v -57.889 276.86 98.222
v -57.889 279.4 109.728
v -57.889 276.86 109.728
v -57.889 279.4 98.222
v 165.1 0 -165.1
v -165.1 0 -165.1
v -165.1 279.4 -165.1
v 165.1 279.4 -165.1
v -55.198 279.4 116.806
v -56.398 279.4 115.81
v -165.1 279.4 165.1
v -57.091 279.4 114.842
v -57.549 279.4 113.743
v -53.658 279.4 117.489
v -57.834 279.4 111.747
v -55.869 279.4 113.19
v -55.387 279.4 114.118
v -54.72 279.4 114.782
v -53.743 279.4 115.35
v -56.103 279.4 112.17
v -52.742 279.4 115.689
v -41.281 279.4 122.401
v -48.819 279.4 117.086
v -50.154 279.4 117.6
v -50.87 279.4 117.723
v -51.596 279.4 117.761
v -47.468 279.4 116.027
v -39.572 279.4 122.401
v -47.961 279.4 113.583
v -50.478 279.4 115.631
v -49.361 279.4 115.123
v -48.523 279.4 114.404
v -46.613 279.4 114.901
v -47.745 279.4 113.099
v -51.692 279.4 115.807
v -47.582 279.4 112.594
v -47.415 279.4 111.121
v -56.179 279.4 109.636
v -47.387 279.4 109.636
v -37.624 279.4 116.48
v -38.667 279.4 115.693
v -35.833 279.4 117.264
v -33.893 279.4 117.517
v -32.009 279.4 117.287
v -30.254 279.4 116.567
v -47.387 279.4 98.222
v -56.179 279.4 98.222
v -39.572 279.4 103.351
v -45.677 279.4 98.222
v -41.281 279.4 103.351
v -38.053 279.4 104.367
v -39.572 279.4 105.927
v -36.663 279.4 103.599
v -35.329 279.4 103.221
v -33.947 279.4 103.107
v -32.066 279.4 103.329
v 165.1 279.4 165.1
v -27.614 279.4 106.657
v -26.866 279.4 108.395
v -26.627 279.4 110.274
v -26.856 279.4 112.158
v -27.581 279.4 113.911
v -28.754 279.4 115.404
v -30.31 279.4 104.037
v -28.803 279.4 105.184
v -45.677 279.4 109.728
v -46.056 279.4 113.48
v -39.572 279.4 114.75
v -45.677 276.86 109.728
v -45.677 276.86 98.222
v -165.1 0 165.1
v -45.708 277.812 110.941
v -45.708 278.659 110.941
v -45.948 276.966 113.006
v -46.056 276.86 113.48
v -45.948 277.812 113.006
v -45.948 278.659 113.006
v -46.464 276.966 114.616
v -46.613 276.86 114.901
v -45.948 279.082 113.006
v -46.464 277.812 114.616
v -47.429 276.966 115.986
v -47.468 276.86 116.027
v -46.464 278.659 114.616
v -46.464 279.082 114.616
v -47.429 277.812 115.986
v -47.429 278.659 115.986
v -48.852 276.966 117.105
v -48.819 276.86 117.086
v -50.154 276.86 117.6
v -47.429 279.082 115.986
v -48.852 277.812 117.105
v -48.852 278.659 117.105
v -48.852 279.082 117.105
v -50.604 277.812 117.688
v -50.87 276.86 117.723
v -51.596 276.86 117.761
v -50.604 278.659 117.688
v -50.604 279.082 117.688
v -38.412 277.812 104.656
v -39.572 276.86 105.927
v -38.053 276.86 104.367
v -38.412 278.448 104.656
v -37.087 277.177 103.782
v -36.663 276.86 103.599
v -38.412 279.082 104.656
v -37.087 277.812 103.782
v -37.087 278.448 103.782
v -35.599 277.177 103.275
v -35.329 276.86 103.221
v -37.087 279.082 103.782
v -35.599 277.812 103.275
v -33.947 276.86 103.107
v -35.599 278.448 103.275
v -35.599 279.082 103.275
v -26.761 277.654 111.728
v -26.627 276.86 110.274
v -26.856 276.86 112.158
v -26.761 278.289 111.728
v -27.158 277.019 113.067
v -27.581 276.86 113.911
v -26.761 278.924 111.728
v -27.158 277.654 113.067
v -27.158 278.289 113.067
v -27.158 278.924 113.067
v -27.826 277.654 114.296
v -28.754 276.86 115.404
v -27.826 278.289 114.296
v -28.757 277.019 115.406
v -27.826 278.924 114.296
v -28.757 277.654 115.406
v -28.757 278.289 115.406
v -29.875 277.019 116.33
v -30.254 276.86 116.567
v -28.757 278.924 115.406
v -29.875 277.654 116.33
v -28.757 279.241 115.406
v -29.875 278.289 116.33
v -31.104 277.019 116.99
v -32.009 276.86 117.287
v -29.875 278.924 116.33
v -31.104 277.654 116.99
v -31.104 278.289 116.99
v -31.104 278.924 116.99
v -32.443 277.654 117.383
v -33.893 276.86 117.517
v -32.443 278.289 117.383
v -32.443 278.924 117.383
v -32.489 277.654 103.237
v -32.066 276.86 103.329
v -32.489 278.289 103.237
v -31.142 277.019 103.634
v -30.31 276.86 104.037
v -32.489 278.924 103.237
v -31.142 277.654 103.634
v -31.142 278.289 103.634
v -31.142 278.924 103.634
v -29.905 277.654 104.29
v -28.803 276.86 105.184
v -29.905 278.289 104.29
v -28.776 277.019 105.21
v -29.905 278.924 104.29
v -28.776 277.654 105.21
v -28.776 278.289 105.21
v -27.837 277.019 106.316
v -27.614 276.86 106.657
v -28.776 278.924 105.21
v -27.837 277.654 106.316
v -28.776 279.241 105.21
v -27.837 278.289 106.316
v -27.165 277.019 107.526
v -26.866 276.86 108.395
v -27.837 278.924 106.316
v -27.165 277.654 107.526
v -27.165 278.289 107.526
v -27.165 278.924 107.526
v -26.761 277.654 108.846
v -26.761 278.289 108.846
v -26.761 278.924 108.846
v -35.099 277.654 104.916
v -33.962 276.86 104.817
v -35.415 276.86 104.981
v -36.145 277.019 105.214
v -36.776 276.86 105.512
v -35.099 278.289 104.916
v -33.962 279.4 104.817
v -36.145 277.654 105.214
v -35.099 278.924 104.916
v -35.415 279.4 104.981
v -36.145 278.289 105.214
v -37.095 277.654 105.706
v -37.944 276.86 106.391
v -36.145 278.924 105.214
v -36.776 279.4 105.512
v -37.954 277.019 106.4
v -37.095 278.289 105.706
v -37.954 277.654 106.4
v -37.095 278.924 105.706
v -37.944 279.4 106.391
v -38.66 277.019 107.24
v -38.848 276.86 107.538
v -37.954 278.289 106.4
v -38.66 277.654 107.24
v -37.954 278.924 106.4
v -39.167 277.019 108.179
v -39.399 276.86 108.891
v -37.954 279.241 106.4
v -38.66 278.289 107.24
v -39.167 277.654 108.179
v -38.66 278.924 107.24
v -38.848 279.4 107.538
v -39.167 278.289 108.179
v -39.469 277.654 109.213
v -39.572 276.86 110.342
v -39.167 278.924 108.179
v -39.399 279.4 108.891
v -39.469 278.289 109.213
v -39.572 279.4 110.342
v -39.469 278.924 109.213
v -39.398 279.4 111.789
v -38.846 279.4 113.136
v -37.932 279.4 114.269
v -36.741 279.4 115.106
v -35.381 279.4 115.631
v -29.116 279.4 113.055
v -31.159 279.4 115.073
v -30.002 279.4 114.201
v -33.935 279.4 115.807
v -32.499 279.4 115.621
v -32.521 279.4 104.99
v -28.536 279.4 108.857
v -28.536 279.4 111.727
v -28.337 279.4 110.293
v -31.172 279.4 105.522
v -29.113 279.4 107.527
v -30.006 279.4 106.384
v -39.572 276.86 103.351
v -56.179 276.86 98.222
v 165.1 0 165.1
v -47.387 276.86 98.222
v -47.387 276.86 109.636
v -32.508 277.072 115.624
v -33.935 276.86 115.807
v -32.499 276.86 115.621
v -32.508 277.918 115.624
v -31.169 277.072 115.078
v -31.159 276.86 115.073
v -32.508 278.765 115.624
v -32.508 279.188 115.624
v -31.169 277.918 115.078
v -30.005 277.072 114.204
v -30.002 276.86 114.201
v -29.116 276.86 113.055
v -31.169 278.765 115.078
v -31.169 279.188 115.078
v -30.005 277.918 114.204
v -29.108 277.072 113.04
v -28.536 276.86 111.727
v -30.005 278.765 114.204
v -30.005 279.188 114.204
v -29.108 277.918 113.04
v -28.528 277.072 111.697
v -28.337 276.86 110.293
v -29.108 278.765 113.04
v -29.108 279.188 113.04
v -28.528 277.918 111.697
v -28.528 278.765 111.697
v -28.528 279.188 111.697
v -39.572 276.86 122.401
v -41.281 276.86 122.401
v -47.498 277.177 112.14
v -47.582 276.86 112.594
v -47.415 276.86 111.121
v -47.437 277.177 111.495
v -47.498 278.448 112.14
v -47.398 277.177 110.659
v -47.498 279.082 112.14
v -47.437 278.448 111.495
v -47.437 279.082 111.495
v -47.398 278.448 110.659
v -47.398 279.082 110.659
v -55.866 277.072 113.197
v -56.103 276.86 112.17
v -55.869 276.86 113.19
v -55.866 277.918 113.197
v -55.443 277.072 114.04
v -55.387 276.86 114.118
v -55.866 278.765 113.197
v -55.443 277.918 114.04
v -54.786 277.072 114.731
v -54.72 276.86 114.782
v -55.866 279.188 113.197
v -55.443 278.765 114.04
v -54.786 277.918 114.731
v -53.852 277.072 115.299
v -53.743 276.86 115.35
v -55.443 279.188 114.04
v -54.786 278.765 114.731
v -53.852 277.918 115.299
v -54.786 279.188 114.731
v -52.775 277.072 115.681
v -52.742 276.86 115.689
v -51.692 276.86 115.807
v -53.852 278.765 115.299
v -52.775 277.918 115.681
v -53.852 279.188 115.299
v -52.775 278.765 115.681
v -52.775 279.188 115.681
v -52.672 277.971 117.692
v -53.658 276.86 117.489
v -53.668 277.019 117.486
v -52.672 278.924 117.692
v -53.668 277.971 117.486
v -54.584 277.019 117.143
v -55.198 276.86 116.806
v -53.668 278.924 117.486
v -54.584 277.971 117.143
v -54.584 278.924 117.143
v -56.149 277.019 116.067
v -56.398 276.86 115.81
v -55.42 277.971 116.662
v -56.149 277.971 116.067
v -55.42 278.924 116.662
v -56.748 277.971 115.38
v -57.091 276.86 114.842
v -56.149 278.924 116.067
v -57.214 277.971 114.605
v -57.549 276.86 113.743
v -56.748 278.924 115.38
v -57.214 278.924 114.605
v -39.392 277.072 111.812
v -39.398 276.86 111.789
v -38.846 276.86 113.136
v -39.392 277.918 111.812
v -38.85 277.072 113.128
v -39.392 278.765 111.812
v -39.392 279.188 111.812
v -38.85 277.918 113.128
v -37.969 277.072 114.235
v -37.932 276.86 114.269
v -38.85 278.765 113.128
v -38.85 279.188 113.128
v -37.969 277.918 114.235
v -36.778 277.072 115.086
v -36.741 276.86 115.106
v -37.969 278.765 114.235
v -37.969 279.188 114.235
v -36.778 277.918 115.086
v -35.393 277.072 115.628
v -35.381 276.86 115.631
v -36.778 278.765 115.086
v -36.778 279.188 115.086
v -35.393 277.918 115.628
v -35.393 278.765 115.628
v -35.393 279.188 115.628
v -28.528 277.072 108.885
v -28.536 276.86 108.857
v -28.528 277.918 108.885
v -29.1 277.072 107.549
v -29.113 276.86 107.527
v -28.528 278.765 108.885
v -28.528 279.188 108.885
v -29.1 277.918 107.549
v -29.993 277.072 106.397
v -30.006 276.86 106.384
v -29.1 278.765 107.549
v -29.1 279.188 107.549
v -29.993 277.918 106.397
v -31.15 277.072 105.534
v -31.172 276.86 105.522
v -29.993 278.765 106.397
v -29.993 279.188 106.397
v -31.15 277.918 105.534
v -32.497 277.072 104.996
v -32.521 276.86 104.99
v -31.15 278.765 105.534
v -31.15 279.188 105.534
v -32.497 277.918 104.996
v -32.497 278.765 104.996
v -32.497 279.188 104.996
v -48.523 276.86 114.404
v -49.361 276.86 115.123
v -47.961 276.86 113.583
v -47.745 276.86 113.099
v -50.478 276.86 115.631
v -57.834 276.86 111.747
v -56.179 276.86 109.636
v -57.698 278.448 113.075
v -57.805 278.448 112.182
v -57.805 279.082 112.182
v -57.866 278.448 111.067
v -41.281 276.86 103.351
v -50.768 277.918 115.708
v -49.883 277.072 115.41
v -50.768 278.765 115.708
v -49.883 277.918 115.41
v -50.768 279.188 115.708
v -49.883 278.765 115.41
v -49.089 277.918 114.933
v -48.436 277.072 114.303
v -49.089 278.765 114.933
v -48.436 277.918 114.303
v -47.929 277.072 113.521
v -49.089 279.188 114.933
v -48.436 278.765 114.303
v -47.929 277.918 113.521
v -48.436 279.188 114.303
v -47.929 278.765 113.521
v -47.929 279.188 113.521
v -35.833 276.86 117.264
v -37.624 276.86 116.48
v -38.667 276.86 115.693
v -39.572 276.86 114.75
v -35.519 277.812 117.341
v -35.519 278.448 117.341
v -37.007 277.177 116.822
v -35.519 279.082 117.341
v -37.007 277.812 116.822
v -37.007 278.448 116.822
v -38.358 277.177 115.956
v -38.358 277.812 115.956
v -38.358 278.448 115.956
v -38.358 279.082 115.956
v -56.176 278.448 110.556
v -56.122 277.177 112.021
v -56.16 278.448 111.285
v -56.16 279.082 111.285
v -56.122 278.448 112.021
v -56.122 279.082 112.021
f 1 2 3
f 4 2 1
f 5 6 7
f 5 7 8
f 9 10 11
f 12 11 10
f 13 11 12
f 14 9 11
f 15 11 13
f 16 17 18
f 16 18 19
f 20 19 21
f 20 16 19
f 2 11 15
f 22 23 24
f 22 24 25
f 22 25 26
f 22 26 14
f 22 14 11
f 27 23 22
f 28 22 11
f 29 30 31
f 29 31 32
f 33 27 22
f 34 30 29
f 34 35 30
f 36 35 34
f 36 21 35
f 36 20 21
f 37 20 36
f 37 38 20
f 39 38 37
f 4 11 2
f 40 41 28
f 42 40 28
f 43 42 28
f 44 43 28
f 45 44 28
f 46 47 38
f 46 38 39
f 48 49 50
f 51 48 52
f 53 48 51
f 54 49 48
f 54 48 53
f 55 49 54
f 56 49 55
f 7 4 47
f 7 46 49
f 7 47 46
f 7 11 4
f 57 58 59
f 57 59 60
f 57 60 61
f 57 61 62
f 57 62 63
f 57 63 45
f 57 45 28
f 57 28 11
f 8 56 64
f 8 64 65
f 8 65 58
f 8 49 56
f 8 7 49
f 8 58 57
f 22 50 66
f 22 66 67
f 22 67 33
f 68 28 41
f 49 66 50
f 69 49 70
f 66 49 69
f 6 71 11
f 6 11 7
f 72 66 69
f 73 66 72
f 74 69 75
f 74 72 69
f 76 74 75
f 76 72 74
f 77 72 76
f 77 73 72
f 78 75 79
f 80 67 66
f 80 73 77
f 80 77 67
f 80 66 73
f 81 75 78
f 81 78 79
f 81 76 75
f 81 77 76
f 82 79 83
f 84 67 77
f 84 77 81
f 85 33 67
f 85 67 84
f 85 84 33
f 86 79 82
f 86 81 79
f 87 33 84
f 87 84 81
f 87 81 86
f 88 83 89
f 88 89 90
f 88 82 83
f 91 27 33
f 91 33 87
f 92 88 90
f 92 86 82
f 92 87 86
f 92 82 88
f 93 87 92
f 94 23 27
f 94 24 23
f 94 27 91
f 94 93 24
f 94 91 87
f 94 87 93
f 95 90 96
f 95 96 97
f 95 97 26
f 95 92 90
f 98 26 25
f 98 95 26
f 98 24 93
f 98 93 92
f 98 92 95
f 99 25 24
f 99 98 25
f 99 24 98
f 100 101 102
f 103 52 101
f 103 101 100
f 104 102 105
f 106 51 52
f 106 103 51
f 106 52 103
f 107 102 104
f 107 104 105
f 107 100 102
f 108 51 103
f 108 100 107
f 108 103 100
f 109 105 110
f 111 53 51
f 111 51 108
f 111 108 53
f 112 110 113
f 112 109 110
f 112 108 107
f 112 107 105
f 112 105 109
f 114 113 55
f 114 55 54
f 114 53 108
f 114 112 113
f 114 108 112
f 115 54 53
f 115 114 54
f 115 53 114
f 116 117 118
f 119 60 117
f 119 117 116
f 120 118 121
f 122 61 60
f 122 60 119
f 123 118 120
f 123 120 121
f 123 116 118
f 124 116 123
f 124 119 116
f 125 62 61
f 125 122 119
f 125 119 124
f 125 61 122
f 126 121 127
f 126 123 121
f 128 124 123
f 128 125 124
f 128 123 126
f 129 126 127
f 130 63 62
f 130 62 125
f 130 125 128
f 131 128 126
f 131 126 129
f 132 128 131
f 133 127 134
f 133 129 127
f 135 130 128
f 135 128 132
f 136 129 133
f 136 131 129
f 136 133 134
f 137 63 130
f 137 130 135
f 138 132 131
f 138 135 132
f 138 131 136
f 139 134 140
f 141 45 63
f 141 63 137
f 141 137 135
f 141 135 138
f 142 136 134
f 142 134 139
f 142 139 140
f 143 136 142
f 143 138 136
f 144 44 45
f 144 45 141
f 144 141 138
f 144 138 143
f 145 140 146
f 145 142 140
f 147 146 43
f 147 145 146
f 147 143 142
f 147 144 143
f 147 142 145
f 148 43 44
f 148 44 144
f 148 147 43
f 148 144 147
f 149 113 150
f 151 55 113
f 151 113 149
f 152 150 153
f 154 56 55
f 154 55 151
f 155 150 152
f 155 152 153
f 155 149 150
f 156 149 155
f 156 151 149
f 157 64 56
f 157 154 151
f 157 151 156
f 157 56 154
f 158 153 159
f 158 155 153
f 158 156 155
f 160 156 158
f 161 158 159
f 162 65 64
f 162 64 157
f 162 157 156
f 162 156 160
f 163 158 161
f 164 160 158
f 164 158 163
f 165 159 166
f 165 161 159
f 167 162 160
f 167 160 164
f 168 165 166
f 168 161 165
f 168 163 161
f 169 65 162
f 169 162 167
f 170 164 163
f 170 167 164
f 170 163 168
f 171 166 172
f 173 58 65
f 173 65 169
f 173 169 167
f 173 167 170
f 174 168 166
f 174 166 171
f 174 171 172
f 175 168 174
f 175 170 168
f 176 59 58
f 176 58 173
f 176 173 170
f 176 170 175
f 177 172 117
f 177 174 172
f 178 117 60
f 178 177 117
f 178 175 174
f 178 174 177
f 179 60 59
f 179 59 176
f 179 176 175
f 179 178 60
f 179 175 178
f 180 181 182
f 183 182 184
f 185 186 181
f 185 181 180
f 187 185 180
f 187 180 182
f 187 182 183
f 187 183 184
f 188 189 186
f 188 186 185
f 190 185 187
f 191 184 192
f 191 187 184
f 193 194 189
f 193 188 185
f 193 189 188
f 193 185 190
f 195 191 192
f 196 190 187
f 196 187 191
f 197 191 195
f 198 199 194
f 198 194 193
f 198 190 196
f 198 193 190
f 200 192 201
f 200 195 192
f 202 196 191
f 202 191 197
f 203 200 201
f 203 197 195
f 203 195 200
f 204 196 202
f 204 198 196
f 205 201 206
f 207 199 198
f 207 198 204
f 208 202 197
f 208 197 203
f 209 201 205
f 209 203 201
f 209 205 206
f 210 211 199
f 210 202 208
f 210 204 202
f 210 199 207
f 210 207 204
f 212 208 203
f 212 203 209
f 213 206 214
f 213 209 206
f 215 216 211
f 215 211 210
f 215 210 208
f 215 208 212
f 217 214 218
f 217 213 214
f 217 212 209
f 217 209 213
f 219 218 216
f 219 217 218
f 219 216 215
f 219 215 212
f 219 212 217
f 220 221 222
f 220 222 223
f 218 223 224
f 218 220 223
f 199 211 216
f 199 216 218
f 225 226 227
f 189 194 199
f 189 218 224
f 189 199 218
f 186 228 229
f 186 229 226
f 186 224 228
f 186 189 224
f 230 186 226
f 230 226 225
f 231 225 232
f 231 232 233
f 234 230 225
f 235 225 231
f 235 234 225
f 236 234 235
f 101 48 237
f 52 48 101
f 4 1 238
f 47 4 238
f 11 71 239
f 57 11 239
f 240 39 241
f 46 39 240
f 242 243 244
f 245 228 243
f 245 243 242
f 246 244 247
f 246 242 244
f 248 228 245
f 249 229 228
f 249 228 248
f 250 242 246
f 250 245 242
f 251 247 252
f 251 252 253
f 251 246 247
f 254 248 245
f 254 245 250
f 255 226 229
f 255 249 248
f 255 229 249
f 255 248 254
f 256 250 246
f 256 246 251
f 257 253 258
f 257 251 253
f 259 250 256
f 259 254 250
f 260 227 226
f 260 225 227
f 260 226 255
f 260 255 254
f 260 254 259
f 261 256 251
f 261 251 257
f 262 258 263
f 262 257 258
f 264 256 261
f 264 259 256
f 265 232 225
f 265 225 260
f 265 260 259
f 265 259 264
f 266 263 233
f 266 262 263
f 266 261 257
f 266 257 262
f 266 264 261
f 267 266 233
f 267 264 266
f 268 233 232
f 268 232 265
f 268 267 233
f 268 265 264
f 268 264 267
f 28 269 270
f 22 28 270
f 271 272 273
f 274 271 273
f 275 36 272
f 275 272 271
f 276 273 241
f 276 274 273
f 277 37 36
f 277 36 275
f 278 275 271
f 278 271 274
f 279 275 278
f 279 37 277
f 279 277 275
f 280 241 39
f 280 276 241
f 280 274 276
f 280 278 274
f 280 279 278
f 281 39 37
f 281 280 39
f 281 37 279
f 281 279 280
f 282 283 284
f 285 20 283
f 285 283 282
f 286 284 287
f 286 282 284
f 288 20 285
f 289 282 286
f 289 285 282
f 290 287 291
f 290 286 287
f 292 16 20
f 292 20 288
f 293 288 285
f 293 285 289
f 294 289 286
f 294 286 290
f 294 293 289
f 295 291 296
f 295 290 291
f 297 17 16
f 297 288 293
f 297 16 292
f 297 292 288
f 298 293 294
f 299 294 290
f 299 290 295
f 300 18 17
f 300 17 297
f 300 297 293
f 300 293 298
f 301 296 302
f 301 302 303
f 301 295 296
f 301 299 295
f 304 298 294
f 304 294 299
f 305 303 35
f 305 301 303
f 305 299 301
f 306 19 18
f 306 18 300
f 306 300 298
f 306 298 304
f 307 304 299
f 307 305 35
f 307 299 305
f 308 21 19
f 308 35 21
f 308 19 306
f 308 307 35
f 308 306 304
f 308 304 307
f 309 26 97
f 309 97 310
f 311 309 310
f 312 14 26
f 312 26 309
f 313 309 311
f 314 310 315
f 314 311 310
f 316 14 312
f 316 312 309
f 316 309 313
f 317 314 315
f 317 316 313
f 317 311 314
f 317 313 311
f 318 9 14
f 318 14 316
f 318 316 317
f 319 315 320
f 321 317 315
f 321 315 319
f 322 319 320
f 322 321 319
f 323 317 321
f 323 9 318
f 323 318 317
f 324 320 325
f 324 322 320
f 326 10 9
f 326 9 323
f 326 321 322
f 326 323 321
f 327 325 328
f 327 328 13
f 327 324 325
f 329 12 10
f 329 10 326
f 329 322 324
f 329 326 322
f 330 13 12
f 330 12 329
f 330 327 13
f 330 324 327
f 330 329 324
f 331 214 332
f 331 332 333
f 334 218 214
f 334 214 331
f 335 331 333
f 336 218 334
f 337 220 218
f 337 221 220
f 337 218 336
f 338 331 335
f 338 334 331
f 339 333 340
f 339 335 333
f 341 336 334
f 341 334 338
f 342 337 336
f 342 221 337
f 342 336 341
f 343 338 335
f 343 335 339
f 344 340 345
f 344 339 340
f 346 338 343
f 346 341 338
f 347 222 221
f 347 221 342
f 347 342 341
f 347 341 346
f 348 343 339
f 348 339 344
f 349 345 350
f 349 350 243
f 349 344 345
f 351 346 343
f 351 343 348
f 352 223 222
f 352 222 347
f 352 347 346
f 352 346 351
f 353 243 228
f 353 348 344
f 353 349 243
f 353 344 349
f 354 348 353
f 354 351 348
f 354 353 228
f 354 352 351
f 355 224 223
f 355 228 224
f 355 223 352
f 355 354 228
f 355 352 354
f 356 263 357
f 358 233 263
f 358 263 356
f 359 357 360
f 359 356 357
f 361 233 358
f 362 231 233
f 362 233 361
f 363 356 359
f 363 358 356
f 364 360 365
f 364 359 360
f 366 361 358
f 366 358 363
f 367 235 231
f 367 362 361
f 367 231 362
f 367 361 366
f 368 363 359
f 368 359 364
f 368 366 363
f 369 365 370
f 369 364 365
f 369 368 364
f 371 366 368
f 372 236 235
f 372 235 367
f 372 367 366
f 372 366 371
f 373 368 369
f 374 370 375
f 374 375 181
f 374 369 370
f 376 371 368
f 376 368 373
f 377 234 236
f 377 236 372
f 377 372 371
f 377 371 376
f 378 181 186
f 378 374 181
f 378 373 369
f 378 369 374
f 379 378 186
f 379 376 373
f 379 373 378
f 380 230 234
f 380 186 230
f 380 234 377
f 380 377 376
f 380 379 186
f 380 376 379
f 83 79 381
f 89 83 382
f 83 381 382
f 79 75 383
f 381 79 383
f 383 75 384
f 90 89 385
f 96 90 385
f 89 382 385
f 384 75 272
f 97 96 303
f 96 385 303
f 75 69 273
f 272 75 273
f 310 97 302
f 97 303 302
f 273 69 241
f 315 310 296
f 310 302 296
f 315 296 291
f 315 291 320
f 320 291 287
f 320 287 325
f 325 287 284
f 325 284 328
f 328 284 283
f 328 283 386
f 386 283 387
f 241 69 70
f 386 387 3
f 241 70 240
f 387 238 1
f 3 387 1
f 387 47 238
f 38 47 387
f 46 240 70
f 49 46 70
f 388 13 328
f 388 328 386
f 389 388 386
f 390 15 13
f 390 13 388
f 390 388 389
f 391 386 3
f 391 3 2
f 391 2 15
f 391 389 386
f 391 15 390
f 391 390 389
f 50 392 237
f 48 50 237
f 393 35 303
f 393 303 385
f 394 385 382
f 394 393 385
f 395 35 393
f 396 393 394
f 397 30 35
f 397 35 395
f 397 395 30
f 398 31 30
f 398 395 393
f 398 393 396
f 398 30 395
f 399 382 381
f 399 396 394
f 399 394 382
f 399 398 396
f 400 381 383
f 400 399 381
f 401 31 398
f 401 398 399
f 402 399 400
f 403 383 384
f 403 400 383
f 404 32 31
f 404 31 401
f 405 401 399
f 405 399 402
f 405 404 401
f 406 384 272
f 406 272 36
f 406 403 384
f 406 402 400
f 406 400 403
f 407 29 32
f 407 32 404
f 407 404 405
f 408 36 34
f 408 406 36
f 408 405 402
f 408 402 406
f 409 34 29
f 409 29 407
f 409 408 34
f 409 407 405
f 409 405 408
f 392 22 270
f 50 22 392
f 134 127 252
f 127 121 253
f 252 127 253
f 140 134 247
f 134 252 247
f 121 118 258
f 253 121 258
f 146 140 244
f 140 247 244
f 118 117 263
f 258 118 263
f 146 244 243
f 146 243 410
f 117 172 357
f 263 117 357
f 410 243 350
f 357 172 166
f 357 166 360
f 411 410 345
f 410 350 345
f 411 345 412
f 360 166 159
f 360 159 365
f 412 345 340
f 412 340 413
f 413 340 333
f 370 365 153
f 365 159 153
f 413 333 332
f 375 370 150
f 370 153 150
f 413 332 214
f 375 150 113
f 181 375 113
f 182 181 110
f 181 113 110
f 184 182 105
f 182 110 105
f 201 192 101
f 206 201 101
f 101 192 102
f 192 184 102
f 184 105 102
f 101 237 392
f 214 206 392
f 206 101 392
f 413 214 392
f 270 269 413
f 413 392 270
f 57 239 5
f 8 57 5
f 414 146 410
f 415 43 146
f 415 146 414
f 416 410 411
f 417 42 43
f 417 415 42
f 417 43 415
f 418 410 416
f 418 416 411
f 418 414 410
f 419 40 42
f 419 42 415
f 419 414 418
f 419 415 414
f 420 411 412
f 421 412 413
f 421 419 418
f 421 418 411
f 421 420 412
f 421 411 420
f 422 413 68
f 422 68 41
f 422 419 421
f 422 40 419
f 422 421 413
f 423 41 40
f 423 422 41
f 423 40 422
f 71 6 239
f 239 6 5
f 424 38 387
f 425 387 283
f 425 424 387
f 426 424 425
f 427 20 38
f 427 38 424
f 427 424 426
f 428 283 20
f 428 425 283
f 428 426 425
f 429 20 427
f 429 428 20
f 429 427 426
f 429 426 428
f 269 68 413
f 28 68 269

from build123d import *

# Parameters (mm, degrees)
SKETCH1_W           = 330.2
SKETCH1_H           = 330.2
BOSS_EXTRUDE1_DEPTH = 279.4
CUT_EXTRUDE1_DEPTH  = 2.54


with BuildPart() as part:
    # Sketch1 → Boss-Extrude1 (new body)
    with BuildSketch(Plane(origin=(0, 0, 0), x_dir=(1, 0, 0), z_dir=(0, 1, 0))):
        Rectangle(SKETCH1_W, SKETCH1_H)
    extrude(amount=BOSS_EXTRUDE1_DEPTH)

    # Sketch2 → Cut-Extrude1 (cut)
    # profile 1 of 2: a face of its own
    with BuildSketch(Plane(origin=(0, 279.4, 0), x_dir=(1, 0, 0), z_dir=(0, 1, 0))):
        with BuildLine():
            Line((-57.888961079, -98.222414931), (-56.179345694, -98.222414931))
            Line((-56.179345694, -98.222414931), (-56.179345694, -109.636387287))
            add(Edge.make_bspline(
                [(-56.179345694, -109.636387287), (-56.179600115, -109.797935292), (-56.180082922, -110.10450047), (-56.176857954, -110.540845077), (-56.167826249, -110.92877089), (-56.162132152, -111.269773224), (-56.149464808, -111.562287321), (-56.13913401, -111.807897941), (-56.125850408, -112.0054421), (-56.109885869, -112.120726855), (-56.103023579, -112.170281518)],
                knots=[0, 0, 0, 0, 1.528628734, 2.90083645, 4.128790002, 5.200304208, 6.127813768, 6.898992206, 7.526736466, 8, 8, 8, 8], degree=3))
            add(Edge.make_bspline(
                [(-56.103023579, -112.170281518), (-56.07484341, -112.349061758), (-56.020070925, -112.696548613), (-55.880481354, -113.191349404), (-55.685531813, -113.637290627), (-55.454520395, -114.048287797), (-55.150087182, -114.412901314), (-54.785396511, -114.748789024), (-54.343557514, -115.042549846), (-53.852281931, -115.311159265), (-53.322772282, -115.527050642), (-52.78169096, -115.690300239), (-52.237171317, -115.789789679), (-51.872629618, -115.801309699), (-51.69160531, -115.807030316)],
                knots=[0, 0, 0, 0, 1.035780045, 2.013197591, 2.933192213, 3.817615948, 4.702609284, 5.640816605, 6.646850145, 7.73207398, 8.84249596, 9.914020372, 10.964143139, 12, 12, 12, 12], degree=3))
            add(Edge.make_bspline(
                [(-51.69160531, -115.807030316), (-51.53619138, -115.801185502), (-51.22626115, -115.789529633), (-50.765760435, -115.717349558), (-50.317268415, -115.587262194), (-49.878570428, -115.419405794), (-49.467357213, -115.197622477), (-49.083399336, -114.941422622), (-48.740695637, -114.640917711), (-48.427959963, -114.308357265), (-48.155626955, -113.933127782), (-47.919564027, -113.523399631), (-47.726201467, -113.073006757), (-47.630714567, -112.756480544), (-47.581659396, -112.593869258)],
                knots=[0, 0, 0, 0, 0.994687771, 1.983630487, 2.973142513, 3.978332533, 4.983357753, 5.956394766, 6.925816176, 7.893390482, 8.871859704, 9.88551698, 10.913711441, 12, 12, 12, 12], degree=3))
            add(Edge.make_bspline(
                [(-47.581659396, -112.593869258), (-47.565330143, -112.526657732), (-47.528941986, -112.376883366), (-47.494940212, -112.123674627), (-47.459526124, -111.824919661), (-47.434953964, -111.478471937), (-47.41099875, -111.085492357), (-47.396667311, -110.643933727), (-47.390043175, -110.155399412), (-47.388069158, -109.814474289), (-47.387038002, -109.636387287)],
                knots=[0, 0, 0, 0, 0.558680831, 1.244966039, 2.062412453, 2.990489873, 4.051219941, 5.244515665, 6.560634259, 8, 8, 8, 8], degree=3))
            Line((-47.387038002, -109.636387287), (-47.387038002, -98.222414931))
            Line((-47.387038002, -98.222414931), (-45.677422617, -98.222414931))
            Line((-45.677422617, -98.222414931), (-45.677422617, -109.727973826))
            add(Edge.make_bspline(
                [(-45.677422617, -109.727973826), (-45.678805758, -109.93533786), (-45.681505042, -110.34002138), (-45.704912466, -110.933028062), (-45.742234136, -111.495563575), (-45.794965015, -112.027703534), (-45.864834989, -112.527543744), (-45.942532975, -112.999465411), (-46.041481577, -113.440080985), (-46.157051946, -113.852826001), (-46.2891694, -114.245721438), (-46.460299079, -114.618604041), (-46.653109572, -114.982809559), (-46.881789325, -115.332829409), (-47.138754137, -115.670213362), (-47.429683999, -115.992915328), (-47.744956932, -116.306092137), (-48.089813963, -116.601710397), (-48.458570394, -116.87281191), (-48.850129306, -117.111196921), (-49.261482867, -117.312711182), (-49.691561796, -117.478587285), (-50.140549629, -117.603308174), (-50.608457687, -117.696245808), (-51.096351011, -117.749054028), (-51.428172925, -117.756902247), (-51.596202666, -117.76087647)],
                knots=[0, 0, 0, 0, 1.316592851, 2.569410997, 3.76748051, 4.895814652, 5.963796859, 6.97159953, 7.931736103, 8.829262218, 9.692595152, 10.560224239, 11.431080259, 12.30701507, 13.211635791, 14.121146779, 15.063487852, 16.031507147, 17.00238618, 17.966455255, 18.938106653, 19.907068911, 20.888905087, 21.893141452, 22.933117798, 24, 24, 24, 24], degree=3))
            add(Edge.make_bspline(
                [(-51.596202666, -117.76087647), (-51.779458781, -117.756605105), (-52.139006624, -117.748224701), (-52.668803819, -117.700203733), (-53.176699659, -117.609752186), (-53.668058361, -117.494581636), (-54.136190324, -117.335738723), (-54.5873675, -117.1501475), (-55.013862607, -116.922215555), (-55.422594664, -116.668614373), (-55.802640837, -116.383274557), (-56.151513846, -116.072268753), (-56.469789656, -115.740578984), (-56.75210356, -115.384614136), (-57.003132946, -115.007142703), (-57.219378822, -114.60709684), (-57.405052336, -114.184631434), (-57.500882365, -113.890971871), (-57.549327666, -113.742517095)],
                knots=[0, 0, 0, 0, 1.13879206, 2.234305948, 3.301075583, 4.341971843, 5.366689343, 6.369221514, 7.369726634, 8.367512178, 9.355451585, 10.318319045, 11.268648973, 12.207971039, 13.137398894, 14.081662264, 15.030215811, 16, 16, 16, 16], degree=3))
            add(Edge.make_bspline(
                [(-57.549327666, -113.742517095), (-57.577506198, -113.641102654), (-57.638626062, -113.421132473), (-57.704078039, -113.057078871), (-57.759100326, -112.637897676), (-57.810837722, -112.163560196), (-57.841366479, -111.633698779), (-57.868131395, -111.048543109), (-57.889149635, -110.407385632), (-57.889025688, -109.960774625), (-57.888961079, -109.727973826)],
                knots=[0, 0, 0, 0, 0.625038921, 1.35572334, 2.194682327, 3.136881307, 4.189498639, 5.346923369, 6.617055217, 8, 8, 8, 8], degree=3))
            Line((-57.888961079, -109.727973826), (-57.888961079, -98.222414931))
        make_face()
    # profile 2 of 2: a face of its own
    with BuildSketch(Plane(origin=(0, 279.4, 0), x_dir=(1, 0, 0), z_dir=(0, 1, 0))):
        with BuildLine():
            Line((-41.281268771, -103.351261085), (-39.571653387, -103.351261085))
            Line((-39.571653387, -103.351261085), (-39.571653387, -105.927132479))
            add(Edge.make_bspline(
                [(-39.571653387, -105.927132479), (-39.390093366, -105.693428528), (-39.037267801, -105.239271668), (-38.429165104, -104.651496825), (-37.78730633, -104.155786958), (-37.095174042, -103.767262029), (-36.363525101, -103.474323038), (-35.595362059, -103.257809175), (-34.784165353, -103.130220578), (-34.229557517, -103.114862679), (-33.946713483, -103.107030316)],
                knots=[0, 0, 0, 0, 1.0828784, 2.104357462, 3.088488658, 4.04616522, 5.001424249, 5.969181776, 6.964304535, 8, 8, 8, 8], degree=3))
            add(Edge.make_bspline(
                [(-33.946713483, -103.107030316), (-33.699653471, -103.114177761), (-33.211326379, -103.128305062), (-32.49252509, -103.223952687), (-31.800327646, -103.387878985), (-31.138650095, -103.624103967), (-30.500403983, -103.916143025), (-29.895037982, -104.284717175), (-29.313122772, -104.711470871), (-28.769293229, -105.202591578), (-28.266801214, -105.733968285), (-27.832209857, -106.305589683), (-27.457349921, -106.898657475), (-27.15434445, -107.522365862), (-26.916990445, -108.171803385), (-26.748181985, -108.849593899), (-26.647719668, -109.553224375), (-26.634240696, -110.031666325), (-26.627422617, -110.273676951)],
                knots=[0, 0, 0, 0, 1.041296284, 2.058176809, 3.050446431, 4.034000596, 5.01514041, 6.003636468, 7.015969324, 8.052561599, 9.08815499, 10.094063707, 11.074456064, 12.040834395, 13.011057502, 13.983766392, 14.980127149, 16, 16, 16, 16], degree=3))
            add(Edge.make_bspline(
                [(-26.627422617, -110.273676951), (-26.63409276, -110.52079523), (-26.647247245, -111.008148139), (-26.749273634, -111.723813625), (-26.91232462, -112.412266331), (-27.14668416, -113.072361151), (-27.449532832, -113.703643596), (-27.818039082, -114.305658409), (-28.25284971, -114.878212708), (-28.749788705, -115.413533493), (-29.288919686, -115.90665261), (-29.865195736, -116.337934103), (-30.469673602, -116.700109303), (-31.099260683, -117.002639411), (-31.759346659, -117.230652585), (-32.446851784, -117.395123757), (-33.161401753, -117.496548655), (-33.647455166, -117.509895316), (-33.893288002, -117.516645701)],
                knots=[0, 0, 0, 0, 1.038740735, 2.04854663, 3.033179607, 4.009277356, 4.987731542, 5.972001279, 6.972200261, 8.005528982, 9.039189865, 10.040446548, 11.026516639, 11.997840187, 12.972163198, 13.956796175, 14.96660207, 16, 16, 16, 16], degree=3))
            add(Edge.make_bspline(
                [(-33.893288002, -117.516645701), (-34.169935215, -117.509598247), (-34.716394567, -117.49567746), (-35.515393316, -117.354601814), (-36.284343039, -117.143762207), (-37.014724528, -116.835157685), (-37.712323622, -116.441881234), (-38.373194279, -115.96230997), (-39.000846891, -115.397446856), (-39.378628841, -114.968920828), (-39.571653387, -114.749969018)],
                knots=[0, 0, 0, 0, 1.014726462, 2.004382257, 2.969841629, 3.936926163, 4.907207904, 5.903978561, 6.929055279, 8, 8, 8, 8], degree=3))
            Line((-39.571653387, -114.749969018), (-39.571653387, -122.401261085))
            Line((-39.571653387, -122.401261085), (-41.281268771, -122.401261085))
            Line((-41.281268771, -122.401261085), (-41.281268771, -103.351261085))
        make_face()
        with BuildLine():
            add(Edge.make_bspline(
                [(-33.961977906, -104.816645701), (-34.155632382, -104.820130534), (-34.536888129, -104.826991274), (-35.09571835, -104.908492338), (-35.633992035, -105.026807758), (-36.146284371, -105.20594253), (-36.637505583, -105.425827499), (-37.103872252, -105.700593874), (-37.545057012, -106.02527122), (-37.959949849, -106.39364022), (-38.334762918, -106.799539594), (-38.666575426, -107.23272467), (-38.945289472, -107.692646858), (-39.176621896, -108.175022046), (-39.352661764, -108.683631383), (-39.477606467, -109.215578209), (-39.556148816, -109.771444759), (-39.566430032, -110.150028165), (-39.571653387, -110.342366854)],
                knots=[0, 0, 0, 0, 1.05670511, 2.080379991, 3.077984906, 4.06214886, 5.038337365, 6.01289324, 7.01187578, 8.025460281, 9.038092164, 10.024533457, 11.000252242, 11.969694649, 12.940728589, 13.933144304, 14.949937299, 16, 16, 16, 16], degree=3))
            add(Edge.make_bspline(
                [(-39.571653387, -110.342366854), (-39.562994584, -110.594850724), (-39.546031257, -111.089488008), (-39.408123583, -111.812213015), (-39.183685931, -112.496117025), (-38.865122504, -113.13544067), (-38.462636421, -113.723175815), (-37.977687884, -114.249448973), (-37.414664856, -114.710952047), (-36.782927713, -115.099687728), (-36.10571583, -115.415308489), (-35.399309652, -115.641264406), (-34.673423657, -115.780450392), (-34.182650374, -115.798122364), (-33.935265166, -115.807030316)],
                knots=[0, 0, 0, 0, 1.03728447, 2.032128127, 3.01272805, 3.987917167, 4.958271349, 5.931593992, 6.91984656, 7.941419022, 8.973179163, 9.983609215, 10.983593296, 12, 12, 12, 12], degree=3))
            add(Edge.make_bspline(
                [(-33.935265166, -115.807030316), (-33.692863343, -115.798559179), (-33.211739303, -115.781745495), (-32.503307241, -115.636213359), (-31.814836766, -115.413899726), (-31.160713256, -115.089725569), (-30.54663113, -114.69245111), (-29.992104388, -114.215874358), (-29.507652473, -113.663479096), (-29.094733627, -113.048389959), (-28.762003685, -112.388849656), (-28.512011951, -111.70641667), (-28.367729573, -111.003496581), (-28.34728191, -110.529980458), (-28.337038002, -110.292757479)],
                knots=[0, 0, 0, 0, 1.00104056, 1.986885549, 2.97790532, 3.984399681, 4.995088187, 5.994304198, 6.996462723, 8.023150851, 9.048424203, 10.043036403, 11.019596776, 12, 12, 12, 12], degree=3))
            add(Edge.make_bspline(
                [(-28.337038002, -110.292757479), (-28.344955911, -110.054061039), (-28.360730039, -109.578527843), (-28.516107487, -108.877689757), (-28.749605937, -108.192499487), (-29.09010592, -107.541966209), (-29.493972829, -106.928152988), (-29.982452913, -106.386295446), (-30.530092496, -105.911837927), (-31.143443517, -105.51986834), (-31.801704976, -105.208071574), (-32.494661875, -104.980104911), (-33.218799197, -104.843087789), (-33.712072574, -104.825537262), (-33.961977906, -104.816645701)],
                knots=[0, 0, 0, 0, 0.983928682, 1.960191568, 2.949917689, 3.96440592, 4.982380491, 5.975291189, 6.965713506, 7.964880129, 8.970154049, 9.96478489, 10.968906225, 12, 12, 12, 12], degree=3))
        make_face(mode=Mode.SUBTRACT)
    extrude(amount=-CUT_EXTRUDE1_DEPTH, mode=Mode.SUBTRACT)


solid = part.part
